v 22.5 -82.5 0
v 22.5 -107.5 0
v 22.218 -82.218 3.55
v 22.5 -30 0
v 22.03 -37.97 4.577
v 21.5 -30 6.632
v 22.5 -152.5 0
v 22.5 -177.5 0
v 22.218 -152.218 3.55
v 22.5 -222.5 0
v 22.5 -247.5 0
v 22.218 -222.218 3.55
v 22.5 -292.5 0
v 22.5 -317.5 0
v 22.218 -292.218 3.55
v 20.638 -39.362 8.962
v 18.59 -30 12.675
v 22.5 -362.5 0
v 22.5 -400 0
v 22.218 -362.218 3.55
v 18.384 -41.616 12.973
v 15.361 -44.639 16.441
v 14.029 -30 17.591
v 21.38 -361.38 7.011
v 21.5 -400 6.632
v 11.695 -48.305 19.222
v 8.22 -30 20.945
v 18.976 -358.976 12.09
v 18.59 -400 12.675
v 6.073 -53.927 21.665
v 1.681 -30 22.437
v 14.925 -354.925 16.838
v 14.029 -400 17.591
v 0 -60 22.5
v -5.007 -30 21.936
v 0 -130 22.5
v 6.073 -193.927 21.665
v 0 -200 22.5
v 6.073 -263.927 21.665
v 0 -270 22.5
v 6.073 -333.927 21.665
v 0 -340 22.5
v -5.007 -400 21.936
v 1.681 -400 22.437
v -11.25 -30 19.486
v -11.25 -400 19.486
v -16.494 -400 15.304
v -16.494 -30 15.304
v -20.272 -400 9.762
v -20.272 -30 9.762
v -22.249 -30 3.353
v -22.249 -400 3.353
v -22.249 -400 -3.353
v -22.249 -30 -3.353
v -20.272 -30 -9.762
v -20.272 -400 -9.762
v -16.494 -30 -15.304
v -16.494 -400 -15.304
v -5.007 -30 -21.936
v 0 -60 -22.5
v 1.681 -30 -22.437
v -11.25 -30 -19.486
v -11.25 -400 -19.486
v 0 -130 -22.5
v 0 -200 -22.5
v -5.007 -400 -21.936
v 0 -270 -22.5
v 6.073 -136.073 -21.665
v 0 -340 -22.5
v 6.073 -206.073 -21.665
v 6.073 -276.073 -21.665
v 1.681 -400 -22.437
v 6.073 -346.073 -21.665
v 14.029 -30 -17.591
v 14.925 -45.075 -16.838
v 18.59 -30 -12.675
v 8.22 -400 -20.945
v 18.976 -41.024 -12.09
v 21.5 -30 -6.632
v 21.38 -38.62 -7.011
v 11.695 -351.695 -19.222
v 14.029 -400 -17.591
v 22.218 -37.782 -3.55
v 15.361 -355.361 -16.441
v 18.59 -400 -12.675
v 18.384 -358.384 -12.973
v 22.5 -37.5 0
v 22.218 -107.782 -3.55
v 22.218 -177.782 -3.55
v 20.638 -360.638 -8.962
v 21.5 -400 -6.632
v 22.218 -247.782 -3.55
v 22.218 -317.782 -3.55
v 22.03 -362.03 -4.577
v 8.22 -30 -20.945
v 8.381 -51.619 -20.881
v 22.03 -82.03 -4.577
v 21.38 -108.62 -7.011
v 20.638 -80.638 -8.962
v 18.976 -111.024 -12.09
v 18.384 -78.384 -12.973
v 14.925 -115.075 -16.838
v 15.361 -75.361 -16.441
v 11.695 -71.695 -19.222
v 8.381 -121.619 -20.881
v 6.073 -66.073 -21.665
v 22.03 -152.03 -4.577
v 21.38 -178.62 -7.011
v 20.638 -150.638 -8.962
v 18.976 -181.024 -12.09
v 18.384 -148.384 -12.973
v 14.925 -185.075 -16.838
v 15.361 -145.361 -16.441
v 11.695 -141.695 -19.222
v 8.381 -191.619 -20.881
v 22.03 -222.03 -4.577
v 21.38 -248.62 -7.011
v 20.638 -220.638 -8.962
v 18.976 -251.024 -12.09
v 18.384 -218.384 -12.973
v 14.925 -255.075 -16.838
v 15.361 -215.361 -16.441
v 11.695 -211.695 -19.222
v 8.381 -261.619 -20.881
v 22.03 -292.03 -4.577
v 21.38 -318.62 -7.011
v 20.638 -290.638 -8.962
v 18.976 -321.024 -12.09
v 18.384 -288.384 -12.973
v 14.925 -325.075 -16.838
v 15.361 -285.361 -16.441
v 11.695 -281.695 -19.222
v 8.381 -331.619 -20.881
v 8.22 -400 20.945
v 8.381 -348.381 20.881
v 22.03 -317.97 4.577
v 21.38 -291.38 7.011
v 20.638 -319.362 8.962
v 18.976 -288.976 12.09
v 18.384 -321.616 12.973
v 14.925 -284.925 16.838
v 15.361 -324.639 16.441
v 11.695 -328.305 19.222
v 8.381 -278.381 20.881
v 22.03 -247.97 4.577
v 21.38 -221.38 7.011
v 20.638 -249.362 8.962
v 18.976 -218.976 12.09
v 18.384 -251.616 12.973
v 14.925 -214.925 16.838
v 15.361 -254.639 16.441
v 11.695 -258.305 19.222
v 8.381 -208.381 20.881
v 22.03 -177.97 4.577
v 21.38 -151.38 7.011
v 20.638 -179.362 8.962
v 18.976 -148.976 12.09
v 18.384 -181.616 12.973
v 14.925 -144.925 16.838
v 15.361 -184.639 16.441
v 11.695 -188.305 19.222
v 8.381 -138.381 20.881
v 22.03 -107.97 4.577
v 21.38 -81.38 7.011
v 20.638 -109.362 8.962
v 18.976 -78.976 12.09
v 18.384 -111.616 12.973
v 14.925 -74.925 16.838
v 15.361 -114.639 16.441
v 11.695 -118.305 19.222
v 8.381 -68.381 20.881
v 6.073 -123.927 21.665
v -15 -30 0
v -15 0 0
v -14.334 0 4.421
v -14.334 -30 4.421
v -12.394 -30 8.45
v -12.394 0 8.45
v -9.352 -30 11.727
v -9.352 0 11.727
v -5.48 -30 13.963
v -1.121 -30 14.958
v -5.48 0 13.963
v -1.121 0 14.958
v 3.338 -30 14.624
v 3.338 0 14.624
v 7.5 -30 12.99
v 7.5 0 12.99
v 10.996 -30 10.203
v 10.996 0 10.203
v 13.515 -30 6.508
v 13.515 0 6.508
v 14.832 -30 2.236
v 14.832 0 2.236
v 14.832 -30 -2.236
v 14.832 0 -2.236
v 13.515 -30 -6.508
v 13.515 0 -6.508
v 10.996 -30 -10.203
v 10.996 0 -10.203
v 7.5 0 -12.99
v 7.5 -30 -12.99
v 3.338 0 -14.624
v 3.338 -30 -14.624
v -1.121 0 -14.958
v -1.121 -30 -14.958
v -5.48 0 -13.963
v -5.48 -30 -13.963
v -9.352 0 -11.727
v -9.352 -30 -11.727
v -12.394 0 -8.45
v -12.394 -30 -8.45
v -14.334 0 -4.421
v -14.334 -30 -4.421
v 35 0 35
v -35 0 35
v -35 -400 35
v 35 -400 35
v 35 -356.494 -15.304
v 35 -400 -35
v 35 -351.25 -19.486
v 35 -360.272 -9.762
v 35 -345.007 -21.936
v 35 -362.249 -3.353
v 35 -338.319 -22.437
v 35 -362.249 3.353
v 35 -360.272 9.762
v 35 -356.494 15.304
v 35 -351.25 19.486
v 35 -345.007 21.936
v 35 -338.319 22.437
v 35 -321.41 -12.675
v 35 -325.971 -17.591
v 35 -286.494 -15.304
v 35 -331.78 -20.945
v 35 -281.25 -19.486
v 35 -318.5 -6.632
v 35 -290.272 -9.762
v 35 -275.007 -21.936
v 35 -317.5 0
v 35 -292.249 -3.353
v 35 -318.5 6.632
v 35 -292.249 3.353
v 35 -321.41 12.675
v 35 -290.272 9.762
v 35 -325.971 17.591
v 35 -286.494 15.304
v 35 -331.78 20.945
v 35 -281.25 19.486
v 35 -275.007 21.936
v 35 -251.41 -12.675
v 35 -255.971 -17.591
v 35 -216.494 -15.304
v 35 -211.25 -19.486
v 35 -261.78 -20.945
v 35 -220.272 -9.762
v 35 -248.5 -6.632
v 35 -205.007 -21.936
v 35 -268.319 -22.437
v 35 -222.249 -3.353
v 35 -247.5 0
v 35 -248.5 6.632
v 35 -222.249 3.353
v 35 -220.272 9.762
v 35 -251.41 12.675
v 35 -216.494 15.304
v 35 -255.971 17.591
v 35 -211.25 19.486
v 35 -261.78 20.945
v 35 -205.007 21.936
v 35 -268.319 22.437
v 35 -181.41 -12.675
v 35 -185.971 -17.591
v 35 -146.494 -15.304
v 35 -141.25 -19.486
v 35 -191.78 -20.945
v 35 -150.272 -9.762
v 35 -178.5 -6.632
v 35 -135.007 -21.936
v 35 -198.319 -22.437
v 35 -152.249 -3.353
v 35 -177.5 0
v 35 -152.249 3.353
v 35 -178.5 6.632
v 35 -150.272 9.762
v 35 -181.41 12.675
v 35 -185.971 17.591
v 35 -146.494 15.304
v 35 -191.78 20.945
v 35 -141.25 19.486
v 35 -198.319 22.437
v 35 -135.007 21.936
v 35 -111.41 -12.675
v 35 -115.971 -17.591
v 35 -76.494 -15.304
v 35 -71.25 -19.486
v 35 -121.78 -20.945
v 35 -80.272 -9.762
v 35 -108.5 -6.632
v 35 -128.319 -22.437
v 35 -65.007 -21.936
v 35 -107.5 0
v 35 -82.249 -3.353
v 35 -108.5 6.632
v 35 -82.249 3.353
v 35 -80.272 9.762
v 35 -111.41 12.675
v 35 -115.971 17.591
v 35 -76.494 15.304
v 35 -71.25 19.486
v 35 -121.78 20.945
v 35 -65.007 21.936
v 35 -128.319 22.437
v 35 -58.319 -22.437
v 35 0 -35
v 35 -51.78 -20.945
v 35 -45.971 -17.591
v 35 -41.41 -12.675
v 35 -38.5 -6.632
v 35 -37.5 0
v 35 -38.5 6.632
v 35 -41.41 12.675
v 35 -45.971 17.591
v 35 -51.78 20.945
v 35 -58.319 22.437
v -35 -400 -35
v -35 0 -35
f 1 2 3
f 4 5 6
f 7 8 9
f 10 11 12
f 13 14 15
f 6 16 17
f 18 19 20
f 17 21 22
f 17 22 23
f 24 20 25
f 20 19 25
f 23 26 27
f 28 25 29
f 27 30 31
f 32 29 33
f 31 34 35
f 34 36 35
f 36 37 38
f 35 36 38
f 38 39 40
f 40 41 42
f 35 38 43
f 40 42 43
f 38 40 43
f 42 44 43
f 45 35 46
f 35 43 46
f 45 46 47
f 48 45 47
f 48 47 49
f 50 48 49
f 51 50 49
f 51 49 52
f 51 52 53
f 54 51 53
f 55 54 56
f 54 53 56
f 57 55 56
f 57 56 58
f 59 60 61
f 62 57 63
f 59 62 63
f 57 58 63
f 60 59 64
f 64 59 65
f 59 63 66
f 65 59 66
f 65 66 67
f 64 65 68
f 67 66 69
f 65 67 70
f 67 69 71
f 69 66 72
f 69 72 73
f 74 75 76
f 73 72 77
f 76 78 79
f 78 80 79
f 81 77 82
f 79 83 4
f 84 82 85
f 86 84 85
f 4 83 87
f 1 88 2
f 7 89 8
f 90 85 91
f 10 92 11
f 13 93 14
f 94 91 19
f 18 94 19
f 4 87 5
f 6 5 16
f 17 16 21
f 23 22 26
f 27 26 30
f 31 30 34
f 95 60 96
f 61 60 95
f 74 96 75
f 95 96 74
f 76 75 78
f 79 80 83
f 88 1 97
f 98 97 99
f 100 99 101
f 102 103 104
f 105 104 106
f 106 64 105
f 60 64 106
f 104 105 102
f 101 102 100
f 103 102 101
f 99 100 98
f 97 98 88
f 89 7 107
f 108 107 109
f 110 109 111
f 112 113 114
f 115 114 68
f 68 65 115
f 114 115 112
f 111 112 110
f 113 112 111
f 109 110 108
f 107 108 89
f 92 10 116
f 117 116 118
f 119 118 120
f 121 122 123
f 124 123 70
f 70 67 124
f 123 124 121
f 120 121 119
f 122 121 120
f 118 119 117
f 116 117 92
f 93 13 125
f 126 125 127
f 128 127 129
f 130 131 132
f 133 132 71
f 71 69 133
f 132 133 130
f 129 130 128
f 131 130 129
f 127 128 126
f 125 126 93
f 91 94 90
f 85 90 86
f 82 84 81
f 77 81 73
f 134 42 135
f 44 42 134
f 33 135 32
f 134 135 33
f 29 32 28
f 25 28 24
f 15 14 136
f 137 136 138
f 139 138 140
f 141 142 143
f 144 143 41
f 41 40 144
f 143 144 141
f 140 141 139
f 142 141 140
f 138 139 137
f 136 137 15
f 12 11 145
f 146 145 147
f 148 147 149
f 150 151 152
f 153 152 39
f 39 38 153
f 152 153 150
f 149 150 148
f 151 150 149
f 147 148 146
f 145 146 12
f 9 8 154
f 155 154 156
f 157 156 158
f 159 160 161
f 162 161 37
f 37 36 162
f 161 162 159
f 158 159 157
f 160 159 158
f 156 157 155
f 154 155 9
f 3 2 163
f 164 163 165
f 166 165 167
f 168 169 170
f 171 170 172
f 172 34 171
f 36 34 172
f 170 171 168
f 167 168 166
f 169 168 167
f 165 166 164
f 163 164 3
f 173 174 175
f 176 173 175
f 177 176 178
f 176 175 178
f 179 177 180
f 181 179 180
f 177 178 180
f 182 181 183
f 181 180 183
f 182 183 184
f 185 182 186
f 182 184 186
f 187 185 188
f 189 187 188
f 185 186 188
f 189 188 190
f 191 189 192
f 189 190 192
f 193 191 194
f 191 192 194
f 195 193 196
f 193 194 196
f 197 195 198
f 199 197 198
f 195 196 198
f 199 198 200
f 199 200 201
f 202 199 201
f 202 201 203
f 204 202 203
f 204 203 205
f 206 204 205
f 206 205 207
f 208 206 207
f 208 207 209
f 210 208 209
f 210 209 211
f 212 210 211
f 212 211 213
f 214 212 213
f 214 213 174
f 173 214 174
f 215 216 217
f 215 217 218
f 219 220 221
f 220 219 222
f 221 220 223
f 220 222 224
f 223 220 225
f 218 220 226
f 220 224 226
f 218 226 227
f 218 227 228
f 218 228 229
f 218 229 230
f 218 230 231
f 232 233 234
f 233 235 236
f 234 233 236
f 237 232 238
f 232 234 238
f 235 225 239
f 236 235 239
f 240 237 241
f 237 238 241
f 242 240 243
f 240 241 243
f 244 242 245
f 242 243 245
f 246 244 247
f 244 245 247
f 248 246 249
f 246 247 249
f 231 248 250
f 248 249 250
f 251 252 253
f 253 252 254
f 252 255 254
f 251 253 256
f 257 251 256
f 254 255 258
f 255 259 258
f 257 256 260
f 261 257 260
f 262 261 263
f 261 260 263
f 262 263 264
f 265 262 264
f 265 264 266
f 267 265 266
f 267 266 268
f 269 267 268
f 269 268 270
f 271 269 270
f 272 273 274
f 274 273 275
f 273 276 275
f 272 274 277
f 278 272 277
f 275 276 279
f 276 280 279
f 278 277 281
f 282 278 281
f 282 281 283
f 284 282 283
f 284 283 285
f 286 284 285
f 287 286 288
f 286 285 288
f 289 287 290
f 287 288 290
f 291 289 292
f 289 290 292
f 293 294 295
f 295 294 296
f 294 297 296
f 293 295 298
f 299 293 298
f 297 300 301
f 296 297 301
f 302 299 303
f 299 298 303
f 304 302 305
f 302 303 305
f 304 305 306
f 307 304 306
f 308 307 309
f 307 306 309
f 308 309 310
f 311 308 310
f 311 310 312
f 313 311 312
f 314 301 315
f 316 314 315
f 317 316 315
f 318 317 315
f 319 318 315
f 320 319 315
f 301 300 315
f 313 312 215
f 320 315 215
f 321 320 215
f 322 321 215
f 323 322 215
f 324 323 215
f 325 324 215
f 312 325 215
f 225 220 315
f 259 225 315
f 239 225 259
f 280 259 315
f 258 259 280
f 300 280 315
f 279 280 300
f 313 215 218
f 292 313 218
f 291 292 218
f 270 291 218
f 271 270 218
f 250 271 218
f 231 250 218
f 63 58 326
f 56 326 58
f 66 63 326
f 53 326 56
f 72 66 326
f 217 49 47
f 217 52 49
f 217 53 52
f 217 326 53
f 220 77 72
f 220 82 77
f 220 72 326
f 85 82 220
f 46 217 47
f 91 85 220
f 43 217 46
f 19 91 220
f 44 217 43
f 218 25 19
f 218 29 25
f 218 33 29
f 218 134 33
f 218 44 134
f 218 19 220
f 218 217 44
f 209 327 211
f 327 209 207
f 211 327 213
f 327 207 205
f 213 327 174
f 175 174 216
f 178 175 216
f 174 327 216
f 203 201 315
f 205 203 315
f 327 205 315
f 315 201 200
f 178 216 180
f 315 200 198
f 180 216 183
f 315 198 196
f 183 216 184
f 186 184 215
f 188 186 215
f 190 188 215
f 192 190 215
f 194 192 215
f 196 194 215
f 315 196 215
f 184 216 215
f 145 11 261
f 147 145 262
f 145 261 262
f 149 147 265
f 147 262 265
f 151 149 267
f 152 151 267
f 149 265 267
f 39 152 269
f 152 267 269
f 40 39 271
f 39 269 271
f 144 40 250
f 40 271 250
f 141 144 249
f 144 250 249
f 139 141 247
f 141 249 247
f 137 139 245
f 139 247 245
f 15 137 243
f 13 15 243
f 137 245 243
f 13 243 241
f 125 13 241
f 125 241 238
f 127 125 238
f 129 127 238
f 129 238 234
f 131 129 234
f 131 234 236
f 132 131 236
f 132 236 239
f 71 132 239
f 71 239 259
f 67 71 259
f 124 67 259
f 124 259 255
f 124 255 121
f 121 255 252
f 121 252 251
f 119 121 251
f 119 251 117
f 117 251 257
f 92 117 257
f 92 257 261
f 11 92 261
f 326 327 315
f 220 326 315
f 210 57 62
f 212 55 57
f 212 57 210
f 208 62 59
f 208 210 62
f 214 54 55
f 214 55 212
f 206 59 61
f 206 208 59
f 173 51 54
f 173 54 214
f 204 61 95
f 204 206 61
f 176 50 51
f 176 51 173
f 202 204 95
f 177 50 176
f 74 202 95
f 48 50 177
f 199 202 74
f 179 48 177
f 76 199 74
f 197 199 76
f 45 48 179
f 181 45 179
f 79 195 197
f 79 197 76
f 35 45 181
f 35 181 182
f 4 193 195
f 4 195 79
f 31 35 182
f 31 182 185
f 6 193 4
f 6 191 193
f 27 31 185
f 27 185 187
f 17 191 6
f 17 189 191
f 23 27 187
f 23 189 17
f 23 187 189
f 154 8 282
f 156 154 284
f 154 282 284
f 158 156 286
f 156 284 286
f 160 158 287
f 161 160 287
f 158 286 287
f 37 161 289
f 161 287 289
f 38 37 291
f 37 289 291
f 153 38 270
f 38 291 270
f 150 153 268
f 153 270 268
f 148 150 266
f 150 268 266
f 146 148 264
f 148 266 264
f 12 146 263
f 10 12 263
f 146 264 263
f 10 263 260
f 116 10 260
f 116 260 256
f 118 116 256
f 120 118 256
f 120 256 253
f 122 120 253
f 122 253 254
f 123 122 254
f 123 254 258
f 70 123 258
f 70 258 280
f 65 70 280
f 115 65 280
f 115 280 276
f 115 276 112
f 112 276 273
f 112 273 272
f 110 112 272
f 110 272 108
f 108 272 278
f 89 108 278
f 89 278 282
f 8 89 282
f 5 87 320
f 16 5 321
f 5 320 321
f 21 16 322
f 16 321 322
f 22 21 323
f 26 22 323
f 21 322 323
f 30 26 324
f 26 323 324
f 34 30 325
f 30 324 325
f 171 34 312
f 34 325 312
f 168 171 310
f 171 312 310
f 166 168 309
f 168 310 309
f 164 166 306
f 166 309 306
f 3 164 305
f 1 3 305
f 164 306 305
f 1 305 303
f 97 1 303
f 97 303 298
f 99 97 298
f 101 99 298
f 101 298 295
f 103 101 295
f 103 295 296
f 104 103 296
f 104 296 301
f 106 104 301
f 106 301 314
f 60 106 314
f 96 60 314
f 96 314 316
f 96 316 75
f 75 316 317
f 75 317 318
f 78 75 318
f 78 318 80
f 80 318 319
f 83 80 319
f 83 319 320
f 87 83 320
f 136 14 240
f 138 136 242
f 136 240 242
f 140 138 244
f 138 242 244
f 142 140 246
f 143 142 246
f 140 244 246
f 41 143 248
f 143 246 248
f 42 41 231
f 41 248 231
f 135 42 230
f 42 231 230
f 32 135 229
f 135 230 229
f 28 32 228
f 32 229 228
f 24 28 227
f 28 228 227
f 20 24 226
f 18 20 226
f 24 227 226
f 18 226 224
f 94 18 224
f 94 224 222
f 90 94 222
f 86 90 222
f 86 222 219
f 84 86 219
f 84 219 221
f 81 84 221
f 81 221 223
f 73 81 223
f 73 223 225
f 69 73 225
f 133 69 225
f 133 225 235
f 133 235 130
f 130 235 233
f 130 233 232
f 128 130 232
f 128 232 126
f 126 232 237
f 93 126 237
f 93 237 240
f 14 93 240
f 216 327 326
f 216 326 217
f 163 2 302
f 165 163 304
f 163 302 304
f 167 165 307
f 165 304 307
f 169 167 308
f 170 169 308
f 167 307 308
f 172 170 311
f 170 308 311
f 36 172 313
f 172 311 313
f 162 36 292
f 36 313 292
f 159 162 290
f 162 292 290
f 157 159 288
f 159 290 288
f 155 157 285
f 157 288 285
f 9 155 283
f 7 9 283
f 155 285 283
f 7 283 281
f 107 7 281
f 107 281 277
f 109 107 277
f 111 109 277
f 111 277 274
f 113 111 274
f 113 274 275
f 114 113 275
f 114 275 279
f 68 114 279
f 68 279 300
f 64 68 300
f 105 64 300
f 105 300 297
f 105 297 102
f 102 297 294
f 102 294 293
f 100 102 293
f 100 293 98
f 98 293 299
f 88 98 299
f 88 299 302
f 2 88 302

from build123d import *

# Parameters (mm, degrees)
F0_W     = 70
F0_H     = 70
F1_DEPTH = 400
F2_R     = 22.5
F3_DEPTH = 35
F4_R     = 22.5
F5_DEPTH = 370
F6_R     = 15
F7_DEPTH = 45


with BuildPart() as f1:
    # F0 (on Front) → F1 (new body)
    with BuildSketch(Plane.XZ):
        Rectangle(F0_W, F0_H)
    extrude(amount=F1_DEPTH)

    # F2 (on face) → F3 (cut)
    with BuildSketch(Plane.YZ.offset(35)):
        with Locations((-340, 0)):
            Circle(F2_R)
        with Locations((-270, 0)):
            Circle(F2_R)
        with Locations((-200, 0)):
            Circle(F2_R)
        with Locations((-130, 0)):
            Circle(F2_R)
        with Locations((-60, 0)):
            Circle(F2_R)
    extrude(amount=-F3_DEPTH, mode=Mode.SUBTRACT)

    # F4 (on face) → F5 (cut)
    with BuildSketch(Plane.XZ.offset(400)):
        Circle(F4_R)
    extrude(amount=-F5_DEPTH, mode=Mode.SUBTRACT)

    # F6 (on face) → F7 (cut)
    with BuildSketch(Plane(origin=(0, 0, 0), x_dir=(-1, 0, 0), z_dir=(0, 1, 0))):
        Circle(F6_R)
    extrude(amount=-F7_DEPTH, mode=Mode.SUBTRACT)


solid = f1.part
